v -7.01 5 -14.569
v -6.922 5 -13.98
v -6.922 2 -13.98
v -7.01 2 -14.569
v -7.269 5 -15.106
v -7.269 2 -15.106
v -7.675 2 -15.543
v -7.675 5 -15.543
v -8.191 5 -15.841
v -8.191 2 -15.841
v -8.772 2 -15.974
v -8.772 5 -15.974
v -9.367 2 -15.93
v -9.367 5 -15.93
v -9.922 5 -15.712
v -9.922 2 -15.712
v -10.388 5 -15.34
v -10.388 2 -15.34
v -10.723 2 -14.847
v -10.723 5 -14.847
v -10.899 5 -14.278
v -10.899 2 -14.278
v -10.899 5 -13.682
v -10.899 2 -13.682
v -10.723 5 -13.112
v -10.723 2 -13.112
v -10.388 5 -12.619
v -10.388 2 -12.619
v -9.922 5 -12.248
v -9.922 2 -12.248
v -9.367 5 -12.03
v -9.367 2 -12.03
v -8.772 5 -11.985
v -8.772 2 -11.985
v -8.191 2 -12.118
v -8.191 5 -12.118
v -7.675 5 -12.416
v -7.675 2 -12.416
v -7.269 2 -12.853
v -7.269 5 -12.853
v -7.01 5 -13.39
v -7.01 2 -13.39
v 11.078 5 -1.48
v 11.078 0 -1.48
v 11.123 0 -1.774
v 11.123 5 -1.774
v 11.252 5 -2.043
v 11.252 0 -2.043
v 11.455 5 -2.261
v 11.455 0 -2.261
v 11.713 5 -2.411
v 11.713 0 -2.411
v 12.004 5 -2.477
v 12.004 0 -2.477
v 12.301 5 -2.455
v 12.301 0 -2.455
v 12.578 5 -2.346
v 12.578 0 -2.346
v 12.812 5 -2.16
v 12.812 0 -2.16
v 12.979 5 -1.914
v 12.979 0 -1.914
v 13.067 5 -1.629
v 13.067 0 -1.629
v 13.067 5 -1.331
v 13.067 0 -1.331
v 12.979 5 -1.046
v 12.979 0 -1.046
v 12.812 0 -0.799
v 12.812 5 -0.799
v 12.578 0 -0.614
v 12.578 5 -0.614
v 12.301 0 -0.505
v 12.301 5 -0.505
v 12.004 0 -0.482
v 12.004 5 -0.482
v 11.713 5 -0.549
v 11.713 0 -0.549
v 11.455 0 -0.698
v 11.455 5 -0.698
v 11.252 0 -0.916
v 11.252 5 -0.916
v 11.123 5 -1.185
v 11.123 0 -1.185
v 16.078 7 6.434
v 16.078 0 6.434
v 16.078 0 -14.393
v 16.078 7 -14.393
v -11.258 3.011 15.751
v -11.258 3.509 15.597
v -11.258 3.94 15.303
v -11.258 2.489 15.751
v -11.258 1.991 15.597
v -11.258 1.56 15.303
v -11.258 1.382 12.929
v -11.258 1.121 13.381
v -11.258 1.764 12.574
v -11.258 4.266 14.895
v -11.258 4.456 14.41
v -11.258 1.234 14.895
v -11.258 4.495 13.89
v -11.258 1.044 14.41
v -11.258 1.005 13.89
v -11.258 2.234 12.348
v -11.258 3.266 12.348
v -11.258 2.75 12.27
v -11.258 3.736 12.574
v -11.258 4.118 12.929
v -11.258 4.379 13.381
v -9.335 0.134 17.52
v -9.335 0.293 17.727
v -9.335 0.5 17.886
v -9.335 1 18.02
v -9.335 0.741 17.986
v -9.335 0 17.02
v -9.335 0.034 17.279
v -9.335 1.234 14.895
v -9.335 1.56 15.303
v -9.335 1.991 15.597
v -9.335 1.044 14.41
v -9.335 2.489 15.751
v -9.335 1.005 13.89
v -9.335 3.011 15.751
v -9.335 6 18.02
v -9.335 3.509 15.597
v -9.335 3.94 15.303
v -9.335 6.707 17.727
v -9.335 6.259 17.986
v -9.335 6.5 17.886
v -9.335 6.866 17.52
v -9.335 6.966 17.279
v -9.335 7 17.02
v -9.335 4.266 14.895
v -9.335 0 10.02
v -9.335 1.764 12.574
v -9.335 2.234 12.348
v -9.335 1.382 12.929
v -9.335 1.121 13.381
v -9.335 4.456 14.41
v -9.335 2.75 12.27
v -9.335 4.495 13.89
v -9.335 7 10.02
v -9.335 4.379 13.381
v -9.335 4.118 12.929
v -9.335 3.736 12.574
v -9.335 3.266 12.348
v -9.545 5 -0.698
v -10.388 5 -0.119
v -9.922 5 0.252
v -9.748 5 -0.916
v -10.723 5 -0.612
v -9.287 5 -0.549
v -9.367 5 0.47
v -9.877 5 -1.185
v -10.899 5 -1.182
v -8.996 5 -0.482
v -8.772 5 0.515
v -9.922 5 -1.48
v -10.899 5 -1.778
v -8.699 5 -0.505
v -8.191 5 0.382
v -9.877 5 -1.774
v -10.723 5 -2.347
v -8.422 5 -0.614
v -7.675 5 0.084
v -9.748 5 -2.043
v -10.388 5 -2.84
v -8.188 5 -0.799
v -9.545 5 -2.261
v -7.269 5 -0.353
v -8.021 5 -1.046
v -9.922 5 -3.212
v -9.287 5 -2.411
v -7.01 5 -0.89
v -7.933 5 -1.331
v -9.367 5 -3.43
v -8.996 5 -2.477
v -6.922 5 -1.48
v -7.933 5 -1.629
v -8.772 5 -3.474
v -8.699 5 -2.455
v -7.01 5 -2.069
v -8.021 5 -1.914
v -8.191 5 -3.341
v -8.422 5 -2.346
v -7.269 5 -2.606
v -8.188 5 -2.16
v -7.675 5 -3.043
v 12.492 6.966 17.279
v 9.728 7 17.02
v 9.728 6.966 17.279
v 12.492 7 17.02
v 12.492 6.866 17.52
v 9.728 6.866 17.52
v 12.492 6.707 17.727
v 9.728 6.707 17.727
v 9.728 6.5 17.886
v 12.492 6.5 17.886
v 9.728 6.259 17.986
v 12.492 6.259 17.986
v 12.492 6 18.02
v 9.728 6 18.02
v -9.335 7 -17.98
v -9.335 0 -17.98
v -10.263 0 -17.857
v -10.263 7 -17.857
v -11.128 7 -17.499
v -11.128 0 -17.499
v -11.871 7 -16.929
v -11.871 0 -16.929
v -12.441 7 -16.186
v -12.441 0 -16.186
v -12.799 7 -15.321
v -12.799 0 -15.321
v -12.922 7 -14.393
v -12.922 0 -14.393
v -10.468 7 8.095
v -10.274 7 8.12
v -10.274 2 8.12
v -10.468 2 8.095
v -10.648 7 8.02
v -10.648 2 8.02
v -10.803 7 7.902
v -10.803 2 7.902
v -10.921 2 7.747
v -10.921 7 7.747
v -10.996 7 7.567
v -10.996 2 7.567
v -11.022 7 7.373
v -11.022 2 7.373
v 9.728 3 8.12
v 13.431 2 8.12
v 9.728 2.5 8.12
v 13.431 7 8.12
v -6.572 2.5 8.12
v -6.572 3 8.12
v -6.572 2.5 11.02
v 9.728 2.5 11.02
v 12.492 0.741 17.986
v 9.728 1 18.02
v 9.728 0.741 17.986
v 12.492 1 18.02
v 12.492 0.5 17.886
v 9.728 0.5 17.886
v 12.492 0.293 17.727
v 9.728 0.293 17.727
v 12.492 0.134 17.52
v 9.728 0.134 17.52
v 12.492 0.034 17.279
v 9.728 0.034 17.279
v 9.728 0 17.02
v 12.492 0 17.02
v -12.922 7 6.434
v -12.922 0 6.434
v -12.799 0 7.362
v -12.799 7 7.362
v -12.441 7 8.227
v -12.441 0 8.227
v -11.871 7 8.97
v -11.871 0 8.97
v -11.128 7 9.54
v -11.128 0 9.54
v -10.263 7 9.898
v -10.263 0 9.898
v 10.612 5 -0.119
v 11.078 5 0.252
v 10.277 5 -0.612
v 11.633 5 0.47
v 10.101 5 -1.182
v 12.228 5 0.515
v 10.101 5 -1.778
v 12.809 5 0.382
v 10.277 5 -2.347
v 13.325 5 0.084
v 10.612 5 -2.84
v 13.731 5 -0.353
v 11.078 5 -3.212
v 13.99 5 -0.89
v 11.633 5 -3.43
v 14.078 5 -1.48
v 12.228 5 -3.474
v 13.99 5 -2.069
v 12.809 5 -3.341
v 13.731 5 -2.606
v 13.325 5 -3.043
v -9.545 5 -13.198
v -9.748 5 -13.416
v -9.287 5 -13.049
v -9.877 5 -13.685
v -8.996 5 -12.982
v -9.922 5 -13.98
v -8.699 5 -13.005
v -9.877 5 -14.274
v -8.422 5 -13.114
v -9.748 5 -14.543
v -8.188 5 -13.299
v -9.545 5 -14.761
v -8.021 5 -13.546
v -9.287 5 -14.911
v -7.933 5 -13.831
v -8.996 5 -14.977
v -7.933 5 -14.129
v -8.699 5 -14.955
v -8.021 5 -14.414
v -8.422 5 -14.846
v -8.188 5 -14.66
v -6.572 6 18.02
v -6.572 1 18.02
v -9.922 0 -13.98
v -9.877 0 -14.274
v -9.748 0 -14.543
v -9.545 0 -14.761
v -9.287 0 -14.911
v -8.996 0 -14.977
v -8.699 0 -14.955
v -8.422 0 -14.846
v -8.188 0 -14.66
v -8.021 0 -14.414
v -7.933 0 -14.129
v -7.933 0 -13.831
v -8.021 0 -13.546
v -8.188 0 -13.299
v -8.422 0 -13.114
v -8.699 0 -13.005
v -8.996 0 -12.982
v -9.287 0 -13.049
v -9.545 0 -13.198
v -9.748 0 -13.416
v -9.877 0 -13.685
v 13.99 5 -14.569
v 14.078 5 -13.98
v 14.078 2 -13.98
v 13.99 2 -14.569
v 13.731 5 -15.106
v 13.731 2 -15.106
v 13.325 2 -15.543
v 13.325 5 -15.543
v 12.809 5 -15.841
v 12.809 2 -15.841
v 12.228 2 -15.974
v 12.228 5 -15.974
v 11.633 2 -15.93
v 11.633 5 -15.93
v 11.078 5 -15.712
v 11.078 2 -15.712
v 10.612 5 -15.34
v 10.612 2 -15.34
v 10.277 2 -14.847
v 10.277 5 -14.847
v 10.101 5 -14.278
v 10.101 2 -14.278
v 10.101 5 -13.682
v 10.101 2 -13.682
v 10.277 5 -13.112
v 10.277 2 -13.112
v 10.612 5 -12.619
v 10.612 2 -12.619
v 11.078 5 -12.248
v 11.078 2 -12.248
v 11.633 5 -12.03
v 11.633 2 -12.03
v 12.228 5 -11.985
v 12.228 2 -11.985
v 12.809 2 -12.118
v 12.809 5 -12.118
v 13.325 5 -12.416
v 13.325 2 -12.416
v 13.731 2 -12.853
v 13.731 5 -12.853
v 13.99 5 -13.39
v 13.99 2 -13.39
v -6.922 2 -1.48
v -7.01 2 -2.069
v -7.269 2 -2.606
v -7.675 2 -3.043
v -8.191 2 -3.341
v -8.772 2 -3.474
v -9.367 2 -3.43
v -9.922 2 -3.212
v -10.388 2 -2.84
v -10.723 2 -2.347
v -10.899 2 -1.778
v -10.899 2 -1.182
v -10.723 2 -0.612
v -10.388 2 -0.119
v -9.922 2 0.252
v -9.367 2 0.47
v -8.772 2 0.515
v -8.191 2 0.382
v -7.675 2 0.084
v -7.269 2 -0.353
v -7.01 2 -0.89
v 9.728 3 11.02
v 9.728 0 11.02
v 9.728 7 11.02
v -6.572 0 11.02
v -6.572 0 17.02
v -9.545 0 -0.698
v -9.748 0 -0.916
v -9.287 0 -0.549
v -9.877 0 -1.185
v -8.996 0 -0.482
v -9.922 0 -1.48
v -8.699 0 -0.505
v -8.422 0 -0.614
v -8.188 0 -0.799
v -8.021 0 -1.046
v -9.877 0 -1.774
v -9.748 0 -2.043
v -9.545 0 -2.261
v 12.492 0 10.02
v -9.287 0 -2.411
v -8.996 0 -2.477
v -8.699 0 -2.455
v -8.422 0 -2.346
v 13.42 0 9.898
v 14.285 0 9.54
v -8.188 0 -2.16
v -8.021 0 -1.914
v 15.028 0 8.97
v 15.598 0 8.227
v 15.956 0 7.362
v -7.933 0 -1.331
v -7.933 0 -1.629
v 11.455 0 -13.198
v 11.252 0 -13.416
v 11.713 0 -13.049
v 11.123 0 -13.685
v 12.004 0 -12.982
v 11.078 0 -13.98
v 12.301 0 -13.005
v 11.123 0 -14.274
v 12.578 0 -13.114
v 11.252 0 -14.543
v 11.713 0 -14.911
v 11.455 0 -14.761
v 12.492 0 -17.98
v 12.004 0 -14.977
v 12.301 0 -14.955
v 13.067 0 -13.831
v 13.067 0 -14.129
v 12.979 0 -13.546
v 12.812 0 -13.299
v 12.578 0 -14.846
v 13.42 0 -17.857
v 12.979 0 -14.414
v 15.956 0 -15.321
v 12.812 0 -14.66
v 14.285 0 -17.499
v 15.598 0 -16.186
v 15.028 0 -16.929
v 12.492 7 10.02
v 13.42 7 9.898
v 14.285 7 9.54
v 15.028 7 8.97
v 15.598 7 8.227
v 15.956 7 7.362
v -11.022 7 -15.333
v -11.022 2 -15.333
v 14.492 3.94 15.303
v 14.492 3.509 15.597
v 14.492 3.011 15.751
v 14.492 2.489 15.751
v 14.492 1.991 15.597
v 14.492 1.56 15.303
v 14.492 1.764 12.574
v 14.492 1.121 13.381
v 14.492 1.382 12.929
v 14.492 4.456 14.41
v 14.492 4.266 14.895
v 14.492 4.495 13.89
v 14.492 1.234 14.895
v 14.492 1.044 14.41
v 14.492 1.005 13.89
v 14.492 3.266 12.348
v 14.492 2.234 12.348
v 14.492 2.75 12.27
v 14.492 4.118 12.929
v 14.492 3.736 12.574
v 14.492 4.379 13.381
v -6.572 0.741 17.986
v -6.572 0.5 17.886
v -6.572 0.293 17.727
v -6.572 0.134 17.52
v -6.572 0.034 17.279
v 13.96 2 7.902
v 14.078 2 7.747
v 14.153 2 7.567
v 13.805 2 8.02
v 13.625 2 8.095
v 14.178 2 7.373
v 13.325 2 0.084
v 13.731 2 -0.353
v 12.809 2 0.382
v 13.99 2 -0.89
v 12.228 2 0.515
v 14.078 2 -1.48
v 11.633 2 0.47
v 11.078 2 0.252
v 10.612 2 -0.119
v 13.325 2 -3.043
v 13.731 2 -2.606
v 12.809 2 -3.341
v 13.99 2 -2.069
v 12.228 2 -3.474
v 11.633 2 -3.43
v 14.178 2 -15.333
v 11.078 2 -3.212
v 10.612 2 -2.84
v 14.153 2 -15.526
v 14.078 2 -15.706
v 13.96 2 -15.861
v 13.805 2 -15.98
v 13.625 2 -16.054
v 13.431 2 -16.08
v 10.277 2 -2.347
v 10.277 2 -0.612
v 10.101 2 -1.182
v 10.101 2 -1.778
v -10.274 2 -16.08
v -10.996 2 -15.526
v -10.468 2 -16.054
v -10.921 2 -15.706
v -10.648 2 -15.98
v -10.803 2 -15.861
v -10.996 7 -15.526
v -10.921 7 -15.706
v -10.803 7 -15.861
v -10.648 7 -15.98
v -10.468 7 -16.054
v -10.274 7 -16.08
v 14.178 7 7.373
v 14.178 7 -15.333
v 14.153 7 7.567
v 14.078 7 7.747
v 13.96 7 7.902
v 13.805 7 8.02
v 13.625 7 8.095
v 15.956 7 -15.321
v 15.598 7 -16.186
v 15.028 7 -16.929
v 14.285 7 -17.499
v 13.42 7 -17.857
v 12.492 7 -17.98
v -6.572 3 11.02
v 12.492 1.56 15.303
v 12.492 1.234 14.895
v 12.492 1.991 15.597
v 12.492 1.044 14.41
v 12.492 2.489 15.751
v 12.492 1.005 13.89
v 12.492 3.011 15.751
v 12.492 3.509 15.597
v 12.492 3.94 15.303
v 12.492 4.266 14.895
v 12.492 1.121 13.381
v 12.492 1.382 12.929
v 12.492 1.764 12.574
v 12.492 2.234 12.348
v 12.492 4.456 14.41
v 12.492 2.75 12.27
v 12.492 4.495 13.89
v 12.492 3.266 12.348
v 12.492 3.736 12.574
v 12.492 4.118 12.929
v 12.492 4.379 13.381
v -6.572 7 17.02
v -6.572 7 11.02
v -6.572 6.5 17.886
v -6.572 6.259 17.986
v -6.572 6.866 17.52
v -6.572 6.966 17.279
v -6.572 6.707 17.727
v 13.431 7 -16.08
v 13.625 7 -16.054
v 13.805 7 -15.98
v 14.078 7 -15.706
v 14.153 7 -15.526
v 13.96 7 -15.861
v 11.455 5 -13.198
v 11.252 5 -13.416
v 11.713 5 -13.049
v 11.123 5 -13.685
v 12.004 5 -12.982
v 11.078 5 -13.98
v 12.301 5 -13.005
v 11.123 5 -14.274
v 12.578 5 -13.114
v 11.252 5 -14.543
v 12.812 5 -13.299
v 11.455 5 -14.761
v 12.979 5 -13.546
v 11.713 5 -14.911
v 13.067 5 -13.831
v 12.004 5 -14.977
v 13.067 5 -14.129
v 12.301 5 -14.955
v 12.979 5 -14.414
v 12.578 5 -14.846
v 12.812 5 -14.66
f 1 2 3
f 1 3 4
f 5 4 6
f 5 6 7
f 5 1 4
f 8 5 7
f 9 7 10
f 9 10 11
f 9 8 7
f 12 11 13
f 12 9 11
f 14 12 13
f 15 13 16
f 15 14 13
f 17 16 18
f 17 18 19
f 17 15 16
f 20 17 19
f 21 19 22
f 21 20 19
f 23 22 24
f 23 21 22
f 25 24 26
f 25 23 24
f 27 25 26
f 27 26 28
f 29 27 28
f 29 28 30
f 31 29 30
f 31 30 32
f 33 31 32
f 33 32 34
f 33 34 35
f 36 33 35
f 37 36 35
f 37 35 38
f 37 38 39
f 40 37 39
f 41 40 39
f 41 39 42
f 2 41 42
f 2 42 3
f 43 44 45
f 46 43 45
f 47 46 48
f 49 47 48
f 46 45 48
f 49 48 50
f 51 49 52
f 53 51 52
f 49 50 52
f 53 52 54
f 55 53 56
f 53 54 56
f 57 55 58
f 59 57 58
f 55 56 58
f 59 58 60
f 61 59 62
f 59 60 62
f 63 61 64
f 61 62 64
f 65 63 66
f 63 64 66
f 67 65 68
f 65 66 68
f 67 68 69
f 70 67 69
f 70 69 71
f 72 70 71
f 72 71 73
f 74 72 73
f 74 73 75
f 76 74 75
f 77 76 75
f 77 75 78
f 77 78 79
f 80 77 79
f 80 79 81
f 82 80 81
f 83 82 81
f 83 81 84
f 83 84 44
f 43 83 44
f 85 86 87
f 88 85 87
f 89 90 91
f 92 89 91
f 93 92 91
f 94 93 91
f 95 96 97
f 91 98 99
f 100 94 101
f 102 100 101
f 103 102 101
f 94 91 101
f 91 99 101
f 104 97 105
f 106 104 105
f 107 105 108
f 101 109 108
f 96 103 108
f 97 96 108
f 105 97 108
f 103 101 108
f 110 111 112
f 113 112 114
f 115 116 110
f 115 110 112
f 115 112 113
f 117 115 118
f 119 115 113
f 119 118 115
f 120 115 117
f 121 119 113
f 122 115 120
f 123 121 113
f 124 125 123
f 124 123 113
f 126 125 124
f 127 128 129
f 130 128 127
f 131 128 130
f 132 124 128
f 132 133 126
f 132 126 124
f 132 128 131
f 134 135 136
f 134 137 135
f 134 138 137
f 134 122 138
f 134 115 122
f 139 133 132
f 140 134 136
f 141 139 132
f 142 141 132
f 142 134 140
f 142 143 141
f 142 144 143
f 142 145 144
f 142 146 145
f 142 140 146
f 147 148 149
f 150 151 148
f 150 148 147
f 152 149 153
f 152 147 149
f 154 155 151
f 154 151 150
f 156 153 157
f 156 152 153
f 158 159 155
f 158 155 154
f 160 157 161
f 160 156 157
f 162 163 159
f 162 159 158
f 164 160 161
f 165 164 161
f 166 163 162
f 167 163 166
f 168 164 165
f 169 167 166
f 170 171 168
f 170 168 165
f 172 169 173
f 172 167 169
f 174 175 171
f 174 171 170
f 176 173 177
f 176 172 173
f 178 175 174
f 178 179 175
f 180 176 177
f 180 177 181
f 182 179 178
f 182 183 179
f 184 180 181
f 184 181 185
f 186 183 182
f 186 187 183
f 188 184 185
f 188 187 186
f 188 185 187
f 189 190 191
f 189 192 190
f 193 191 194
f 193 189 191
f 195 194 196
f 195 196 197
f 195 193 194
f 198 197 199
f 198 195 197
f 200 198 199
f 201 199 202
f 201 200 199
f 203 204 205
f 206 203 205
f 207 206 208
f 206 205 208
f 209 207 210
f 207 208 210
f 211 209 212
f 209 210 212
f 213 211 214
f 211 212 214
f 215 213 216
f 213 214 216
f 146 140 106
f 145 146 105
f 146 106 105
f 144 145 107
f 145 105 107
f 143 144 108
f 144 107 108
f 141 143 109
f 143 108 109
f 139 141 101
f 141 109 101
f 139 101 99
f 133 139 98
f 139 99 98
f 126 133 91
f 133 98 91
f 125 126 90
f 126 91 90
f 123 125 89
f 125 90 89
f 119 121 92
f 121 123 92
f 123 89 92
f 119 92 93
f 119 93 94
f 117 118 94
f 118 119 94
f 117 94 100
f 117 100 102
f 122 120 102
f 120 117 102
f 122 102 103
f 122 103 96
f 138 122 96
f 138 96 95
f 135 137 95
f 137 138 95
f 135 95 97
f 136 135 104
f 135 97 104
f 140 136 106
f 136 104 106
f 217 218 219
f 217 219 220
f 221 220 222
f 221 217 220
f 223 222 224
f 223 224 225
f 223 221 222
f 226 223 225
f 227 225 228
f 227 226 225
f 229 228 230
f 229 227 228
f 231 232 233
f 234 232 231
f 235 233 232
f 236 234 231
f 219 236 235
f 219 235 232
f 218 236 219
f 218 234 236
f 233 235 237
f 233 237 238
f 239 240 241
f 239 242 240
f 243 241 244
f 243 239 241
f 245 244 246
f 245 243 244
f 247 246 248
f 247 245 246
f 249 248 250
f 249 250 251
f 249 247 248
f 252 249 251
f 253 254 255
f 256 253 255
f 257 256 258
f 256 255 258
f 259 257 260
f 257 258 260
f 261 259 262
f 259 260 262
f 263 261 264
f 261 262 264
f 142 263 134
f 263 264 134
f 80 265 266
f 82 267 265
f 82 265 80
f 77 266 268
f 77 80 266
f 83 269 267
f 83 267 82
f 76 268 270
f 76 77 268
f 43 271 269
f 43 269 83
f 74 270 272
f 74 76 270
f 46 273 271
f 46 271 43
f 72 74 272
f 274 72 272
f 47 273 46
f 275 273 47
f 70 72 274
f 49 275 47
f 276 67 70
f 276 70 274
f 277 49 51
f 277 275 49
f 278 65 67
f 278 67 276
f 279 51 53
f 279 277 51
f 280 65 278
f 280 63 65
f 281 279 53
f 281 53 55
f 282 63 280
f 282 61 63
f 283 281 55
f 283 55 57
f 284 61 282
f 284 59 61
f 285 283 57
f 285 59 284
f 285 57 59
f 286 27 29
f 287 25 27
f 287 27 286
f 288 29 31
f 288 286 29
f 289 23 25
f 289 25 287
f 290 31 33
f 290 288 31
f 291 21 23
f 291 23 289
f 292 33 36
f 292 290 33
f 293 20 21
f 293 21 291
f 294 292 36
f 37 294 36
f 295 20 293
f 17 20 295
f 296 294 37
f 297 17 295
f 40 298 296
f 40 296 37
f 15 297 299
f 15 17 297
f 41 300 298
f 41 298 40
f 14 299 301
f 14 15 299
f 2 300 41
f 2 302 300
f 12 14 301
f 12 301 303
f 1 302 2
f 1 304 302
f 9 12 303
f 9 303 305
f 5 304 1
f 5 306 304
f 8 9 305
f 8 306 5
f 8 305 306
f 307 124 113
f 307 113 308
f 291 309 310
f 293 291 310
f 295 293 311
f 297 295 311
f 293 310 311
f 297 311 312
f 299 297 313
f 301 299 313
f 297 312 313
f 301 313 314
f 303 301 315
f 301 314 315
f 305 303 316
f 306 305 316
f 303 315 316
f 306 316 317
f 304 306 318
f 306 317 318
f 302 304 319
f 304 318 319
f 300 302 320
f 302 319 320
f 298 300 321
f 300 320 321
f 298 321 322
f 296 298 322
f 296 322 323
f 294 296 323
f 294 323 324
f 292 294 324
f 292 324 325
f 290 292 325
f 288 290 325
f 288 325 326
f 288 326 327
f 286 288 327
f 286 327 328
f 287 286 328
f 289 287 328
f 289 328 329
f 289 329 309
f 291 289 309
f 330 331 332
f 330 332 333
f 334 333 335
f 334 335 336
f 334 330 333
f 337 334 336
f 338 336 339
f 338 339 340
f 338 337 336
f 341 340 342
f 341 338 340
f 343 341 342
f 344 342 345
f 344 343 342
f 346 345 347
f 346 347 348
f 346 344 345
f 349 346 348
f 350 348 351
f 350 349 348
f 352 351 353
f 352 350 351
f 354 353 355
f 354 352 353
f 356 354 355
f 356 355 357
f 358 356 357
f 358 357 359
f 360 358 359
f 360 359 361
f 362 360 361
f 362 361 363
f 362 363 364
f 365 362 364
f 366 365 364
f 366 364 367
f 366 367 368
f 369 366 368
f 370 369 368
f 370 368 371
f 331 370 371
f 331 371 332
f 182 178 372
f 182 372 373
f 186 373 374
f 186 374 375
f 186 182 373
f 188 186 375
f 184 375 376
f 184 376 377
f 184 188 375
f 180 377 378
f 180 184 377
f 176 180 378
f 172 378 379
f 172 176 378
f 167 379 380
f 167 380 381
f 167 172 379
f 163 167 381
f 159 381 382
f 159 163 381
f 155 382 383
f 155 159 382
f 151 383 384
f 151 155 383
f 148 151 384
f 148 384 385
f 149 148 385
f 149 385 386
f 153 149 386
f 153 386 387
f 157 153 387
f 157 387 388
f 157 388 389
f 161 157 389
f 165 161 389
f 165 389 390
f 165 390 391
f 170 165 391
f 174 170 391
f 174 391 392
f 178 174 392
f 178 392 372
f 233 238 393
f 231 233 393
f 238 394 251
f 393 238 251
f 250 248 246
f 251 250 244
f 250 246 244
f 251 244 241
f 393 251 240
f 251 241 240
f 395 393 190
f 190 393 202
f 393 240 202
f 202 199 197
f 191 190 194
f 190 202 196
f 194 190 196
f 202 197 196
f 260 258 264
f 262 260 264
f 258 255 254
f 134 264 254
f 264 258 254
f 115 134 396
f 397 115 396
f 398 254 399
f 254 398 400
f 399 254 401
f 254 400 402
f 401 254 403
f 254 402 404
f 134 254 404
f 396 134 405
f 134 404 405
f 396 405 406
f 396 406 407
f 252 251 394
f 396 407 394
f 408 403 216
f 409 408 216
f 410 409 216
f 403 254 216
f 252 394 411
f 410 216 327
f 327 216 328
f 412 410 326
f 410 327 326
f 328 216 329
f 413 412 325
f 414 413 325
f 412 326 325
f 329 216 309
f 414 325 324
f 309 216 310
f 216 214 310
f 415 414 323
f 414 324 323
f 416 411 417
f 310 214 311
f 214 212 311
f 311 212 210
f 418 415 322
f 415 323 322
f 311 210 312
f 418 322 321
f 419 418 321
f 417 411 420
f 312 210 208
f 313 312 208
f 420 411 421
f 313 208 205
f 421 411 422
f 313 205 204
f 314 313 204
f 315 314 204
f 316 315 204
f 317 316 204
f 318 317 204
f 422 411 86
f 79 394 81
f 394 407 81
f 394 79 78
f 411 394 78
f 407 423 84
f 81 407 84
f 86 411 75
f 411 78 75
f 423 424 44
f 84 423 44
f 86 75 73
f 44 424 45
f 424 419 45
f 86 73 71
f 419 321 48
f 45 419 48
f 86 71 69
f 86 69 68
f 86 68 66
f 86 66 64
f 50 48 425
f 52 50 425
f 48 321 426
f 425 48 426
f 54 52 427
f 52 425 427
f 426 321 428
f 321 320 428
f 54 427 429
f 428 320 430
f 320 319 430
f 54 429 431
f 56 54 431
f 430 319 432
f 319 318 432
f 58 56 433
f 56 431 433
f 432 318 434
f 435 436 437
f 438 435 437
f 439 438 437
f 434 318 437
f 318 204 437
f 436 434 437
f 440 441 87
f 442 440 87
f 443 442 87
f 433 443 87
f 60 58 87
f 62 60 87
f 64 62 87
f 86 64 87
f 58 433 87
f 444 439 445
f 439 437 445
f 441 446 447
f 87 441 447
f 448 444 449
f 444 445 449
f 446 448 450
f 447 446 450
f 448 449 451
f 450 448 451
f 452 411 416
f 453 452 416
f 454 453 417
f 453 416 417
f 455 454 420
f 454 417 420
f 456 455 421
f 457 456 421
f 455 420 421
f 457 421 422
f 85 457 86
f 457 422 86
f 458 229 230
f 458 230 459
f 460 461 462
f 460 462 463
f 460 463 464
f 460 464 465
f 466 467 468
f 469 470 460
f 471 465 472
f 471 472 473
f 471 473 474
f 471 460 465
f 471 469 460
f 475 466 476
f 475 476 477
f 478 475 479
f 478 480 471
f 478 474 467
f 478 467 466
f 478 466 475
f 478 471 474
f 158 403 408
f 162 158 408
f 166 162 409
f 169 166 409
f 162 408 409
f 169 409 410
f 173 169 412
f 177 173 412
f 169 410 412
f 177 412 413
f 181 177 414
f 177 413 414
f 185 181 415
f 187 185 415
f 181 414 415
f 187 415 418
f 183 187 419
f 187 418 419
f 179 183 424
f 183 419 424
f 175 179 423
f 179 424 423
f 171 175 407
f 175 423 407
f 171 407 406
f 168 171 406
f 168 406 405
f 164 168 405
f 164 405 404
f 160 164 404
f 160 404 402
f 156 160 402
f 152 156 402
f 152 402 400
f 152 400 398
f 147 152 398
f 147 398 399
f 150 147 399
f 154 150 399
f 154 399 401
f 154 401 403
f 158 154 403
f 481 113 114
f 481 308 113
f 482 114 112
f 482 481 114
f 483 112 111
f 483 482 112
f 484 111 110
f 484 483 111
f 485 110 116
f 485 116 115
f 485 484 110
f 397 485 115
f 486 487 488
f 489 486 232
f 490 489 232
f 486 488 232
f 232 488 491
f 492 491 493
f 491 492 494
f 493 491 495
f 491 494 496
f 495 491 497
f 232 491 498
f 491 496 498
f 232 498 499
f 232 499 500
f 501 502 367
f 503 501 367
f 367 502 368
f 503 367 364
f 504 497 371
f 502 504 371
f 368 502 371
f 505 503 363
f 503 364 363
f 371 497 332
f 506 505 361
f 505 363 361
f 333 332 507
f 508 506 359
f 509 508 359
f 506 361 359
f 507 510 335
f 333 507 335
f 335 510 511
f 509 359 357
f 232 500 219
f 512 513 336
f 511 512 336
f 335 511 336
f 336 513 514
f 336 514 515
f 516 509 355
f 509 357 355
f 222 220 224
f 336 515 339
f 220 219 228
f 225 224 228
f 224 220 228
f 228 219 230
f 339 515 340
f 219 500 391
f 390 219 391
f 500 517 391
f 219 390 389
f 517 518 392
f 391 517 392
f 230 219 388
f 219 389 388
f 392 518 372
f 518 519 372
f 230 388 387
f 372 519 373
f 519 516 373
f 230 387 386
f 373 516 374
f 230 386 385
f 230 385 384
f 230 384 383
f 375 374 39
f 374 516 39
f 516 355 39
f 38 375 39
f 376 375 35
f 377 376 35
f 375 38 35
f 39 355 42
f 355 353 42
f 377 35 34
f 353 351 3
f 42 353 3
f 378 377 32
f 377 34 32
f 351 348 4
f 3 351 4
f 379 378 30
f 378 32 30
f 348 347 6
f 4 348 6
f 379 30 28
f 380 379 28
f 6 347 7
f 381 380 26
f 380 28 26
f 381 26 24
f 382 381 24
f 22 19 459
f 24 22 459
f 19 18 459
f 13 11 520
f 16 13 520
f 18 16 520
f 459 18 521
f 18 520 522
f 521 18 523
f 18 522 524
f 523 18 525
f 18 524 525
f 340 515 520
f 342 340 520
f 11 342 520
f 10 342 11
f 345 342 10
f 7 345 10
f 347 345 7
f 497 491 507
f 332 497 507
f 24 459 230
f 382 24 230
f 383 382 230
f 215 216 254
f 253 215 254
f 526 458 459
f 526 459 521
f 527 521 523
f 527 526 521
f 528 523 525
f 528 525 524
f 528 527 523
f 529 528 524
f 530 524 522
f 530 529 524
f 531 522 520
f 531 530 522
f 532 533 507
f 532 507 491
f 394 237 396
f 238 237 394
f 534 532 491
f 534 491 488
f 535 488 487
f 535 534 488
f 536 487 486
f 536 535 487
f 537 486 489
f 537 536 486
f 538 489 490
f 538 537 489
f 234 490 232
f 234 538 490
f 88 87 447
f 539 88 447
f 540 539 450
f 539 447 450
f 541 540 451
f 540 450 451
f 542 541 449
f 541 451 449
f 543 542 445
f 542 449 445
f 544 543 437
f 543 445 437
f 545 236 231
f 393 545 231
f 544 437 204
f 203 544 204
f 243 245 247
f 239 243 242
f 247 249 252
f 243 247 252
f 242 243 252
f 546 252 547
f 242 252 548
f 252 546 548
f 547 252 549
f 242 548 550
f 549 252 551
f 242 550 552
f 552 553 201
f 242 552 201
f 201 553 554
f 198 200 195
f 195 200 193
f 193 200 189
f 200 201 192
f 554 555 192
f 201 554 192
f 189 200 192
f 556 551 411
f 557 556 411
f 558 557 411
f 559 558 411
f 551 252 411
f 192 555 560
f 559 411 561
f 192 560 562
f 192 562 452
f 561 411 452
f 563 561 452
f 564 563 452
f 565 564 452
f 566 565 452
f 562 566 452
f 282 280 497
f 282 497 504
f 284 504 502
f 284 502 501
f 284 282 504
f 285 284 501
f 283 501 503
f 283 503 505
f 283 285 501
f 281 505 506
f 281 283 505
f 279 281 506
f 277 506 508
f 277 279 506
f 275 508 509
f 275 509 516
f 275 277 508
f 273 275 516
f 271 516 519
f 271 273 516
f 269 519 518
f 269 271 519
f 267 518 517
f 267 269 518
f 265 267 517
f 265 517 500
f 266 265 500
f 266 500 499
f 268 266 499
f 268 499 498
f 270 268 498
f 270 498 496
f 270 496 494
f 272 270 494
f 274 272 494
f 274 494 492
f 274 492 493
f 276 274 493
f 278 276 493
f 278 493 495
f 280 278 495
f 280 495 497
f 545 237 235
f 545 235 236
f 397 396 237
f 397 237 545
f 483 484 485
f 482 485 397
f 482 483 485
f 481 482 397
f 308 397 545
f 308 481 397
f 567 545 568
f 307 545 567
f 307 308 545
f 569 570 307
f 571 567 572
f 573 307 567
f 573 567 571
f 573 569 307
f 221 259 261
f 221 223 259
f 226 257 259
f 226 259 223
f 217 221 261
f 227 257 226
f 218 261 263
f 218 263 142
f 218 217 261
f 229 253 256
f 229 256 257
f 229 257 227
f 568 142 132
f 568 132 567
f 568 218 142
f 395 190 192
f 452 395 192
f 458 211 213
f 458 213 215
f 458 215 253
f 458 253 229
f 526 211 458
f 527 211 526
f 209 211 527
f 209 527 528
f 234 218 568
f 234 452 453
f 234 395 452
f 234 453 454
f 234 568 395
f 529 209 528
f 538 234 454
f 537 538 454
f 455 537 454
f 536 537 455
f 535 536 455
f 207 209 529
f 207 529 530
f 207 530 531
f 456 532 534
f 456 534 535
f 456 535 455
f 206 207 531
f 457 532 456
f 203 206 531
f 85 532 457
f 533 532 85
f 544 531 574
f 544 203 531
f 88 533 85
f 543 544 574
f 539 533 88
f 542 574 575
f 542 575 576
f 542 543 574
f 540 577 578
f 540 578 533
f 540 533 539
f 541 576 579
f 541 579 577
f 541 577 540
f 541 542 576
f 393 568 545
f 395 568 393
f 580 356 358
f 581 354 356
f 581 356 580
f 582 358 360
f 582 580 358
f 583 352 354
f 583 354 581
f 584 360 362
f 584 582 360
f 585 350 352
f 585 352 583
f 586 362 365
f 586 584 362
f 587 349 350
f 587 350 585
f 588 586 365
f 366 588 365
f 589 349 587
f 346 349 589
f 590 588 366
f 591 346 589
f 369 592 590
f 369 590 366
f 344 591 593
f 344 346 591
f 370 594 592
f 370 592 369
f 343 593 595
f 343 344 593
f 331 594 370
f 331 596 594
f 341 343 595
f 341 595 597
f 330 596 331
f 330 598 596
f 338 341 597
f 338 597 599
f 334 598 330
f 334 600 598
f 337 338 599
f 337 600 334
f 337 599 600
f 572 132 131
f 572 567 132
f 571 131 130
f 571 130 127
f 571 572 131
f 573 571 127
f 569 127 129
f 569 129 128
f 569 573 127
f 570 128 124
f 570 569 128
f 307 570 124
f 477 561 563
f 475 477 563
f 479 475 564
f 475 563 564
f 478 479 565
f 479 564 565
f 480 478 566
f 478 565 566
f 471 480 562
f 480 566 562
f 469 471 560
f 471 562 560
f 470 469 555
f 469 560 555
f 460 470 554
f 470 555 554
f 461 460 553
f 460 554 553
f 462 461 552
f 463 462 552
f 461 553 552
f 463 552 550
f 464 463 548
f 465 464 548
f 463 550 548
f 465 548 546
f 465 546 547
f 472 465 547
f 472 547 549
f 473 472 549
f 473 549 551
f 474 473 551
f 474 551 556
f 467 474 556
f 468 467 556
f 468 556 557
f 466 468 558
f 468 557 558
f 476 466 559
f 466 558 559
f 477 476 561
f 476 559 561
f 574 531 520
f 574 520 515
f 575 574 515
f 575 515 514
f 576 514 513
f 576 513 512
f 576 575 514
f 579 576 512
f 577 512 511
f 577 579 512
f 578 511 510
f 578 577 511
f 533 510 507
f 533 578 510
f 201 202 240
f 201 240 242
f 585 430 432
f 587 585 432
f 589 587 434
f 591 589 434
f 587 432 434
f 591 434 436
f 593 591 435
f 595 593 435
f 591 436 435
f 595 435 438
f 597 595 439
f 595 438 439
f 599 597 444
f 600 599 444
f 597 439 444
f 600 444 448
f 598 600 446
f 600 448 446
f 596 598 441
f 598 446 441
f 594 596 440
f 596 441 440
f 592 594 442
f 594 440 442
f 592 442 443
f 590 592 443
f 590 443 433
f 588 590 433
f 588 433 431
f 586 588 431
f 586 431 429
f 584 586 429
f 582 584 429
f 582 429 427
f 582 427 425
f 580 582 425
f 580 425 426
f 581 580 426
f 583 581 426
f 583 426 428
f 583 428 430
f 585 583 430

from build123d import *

# Parameters (mm, degrees)
BOSS_EXTRUDE1_DEPTH   = 7
SKETCH2_R             = 2
CUT_EXTRUDE2_DEPTH    = 5
SKETCH3_R             = 2
CUT_EXTRUDE3_DEPTH    = 2
SKETCH4_W             = 16.3
SKETCH4_H             = 0.5
CUT_EXTRUDE4_DEPTH    = 2
F_2_0MM_DOWEL_HOLE1_D = 2
SKETCH8_W             = 21.826362025
SKETCH8_H             = 7
SKETCH8_W_2           = 16.3
SKETCH8_H_2           = 0.5
BOSS_EXTRUDE2_DEPTH   = 8
SKETCH9_R             = 1.75
BOSS_EXTRUDE3_DEPTH   = 2
LPATTERN4_COUNT       = 2
LPATTERN4_PITCH       = 23.75
SKETCH10_W            = 16.3
SKETCH10_H            = 7
CUT_EXTRUDE5_DEPTH    = 7
FILLET1_R             = 1


with BuildPart() as part:
    # Sketch1 → Boss-Extrude1 (new body)
    with BuildSketch(Plane(origin=(0, 0, 0), x_dir=(1, 0, 0), z_dir=(0, 1, 0))):
        with BuildLine():
            Line((-12.921525848, 14.392842997), (-12.921525848, -6.433519028))
            ThreePointArc((-12.921525848, -6.433519028), (-11.87097089, -8.969783057), (-9.334706861, -10.020338016))
            Line((-9.334706861, -10.020338016), (12.491655164, -10.020338016))
            ThreePointArc((12.491655164, -10.020338016), (15.027919193, -8.969783057), (16.078474152, -6.433519028))
            Line((16.078474152, -6.433519028), (16.078474152, 14.392842997))
            ThreePointArc((16.078474152, 14.392842997), (15.027919193, 16.929107026), (12.491655164, 17.979661984))
            Line((12.491655164, 17.979661984), (-9.334706861, 17.979661984))
            ThreePointArc((-9.334706861, 17.979661984), (-11.87097089, 16.929107026), (-12.921525848, 14.392842997))
        make_face()
    extrude(amount=BOSS_EXTRUDE1_DEPTH)

    # Sketch2 → Cut-Extrude2 (cut)
    with BuildSketch(Plane(origin=(0, 7, 0), x_dir=(1, 0, 0), z_dir=(0, 1, 0))):
        with BuildLine():
            Line((-10.27448552, 16.079661984), (13.431433823, 16.079661984))
            ThreePointArc((13.431433823, 16.079661984), (13.959671105, 15.860858938), (14.178474152, 15.332621656))
            Line((14.178474152, 15.332621656), (14.178474152, -7.373297687))
            ThreePointArc((14.178474152, -7.373297687), (13.959671105, -7.901534969), (13.431433823, -8.120338016))
            Line((13.431433823, -8.120338016), (-10.27448552, -8.120338016))
            ThreePointArc((-10.27448552, -8.120338016), (-10.802722802, -7.901534969), (-11.021525848, -7.373297687))
            Line((-11.021525848, -7.373297687), (-11.021525848, 15.332621656))
            ThreePointArc((-11.021525848, 15.332621656), (-10.802722802, 15.860858938), (-10.27448552, 16.079661984))
        make_face()
        with Locations((-8.921525848, 13.979661984)):
            Circle(SKETCH2_R, mode=Mode.SUBTRACT)
        with Locations((12.078474152, 13.979661984)):
            Circle(SKETCH2_R, mode=Mode.SUBTRACT)
        with Locations((-8.921525848, 1.479661984)):
            Circle(SKETCH2_R, mode=Mode.SUBTRACT)
        with Locations((12.078474152, 1.479661984)):
            Circle(SKETCH2_R, mode=Mode.SUBTRACT)
    extrude(amount=-CUT_EXTRUDE2_DEPTH, mode=Mode.SUBTRACT)

    # Sketch3 → Cut-Extrude3 (cut)
    with BuildSketch(Plane(origin=(0, 7, 0), x_dir=(1, 0, 0), z_dir=(0, 1, 0))):
        with Locations((12.078474152, 13.979661984)):
            Circle(SKETCH3_R)
        with Locations((12.078474152, 1.479661984)):
            Circle(SKETCH3_R)
        with Locations((-8.921525848, 13.979661984)):
            Circle(SKETCH3_R)
        with Locations((-8.921525848, 1.479661984)):
            Circle(SKETCH3_R)
    extrude(amount=-CUT_EXTRUDE3_DEPTH, mode=Mode.SUBTRACT)

    # Sketch4 → Cut-Extrude4 (cut)
    with BuildSketch(Plane.XY.offset(10.020338016)):
        with Locations((1.578474152, 2.75)):
            Rectangle(SKETCH4_W, SKETCH4_H)
    extrude(amount=-CUT_EXTRUDE4_DEPTH, mode=Mode.SUBTRACT)

    # Ø2.0mm Dowel Hole1 (through all)
    with Locations(Plane(origin=(0, 5, 0), x_dir=(1, 0, 0), z_dir=(0, 1, 0))):
        with Locations((12.078474152, 1.479661984), (12.078474152, 13.979661984), (-8.921525848, 1.479661984), (-8.921525848, 13.979661984)):
            Hole(F_2_0MM_DOWEL_HOLE1_D / 2)

    # Sketch8 → Boss-Extrude2 (add)
    with BuildSketch(Plane.XY.offset(10.020338016)):
        with Locations((1.578474152, 3.5)):
            Rectangle(SKETCH8_W, SKETCH8_H)
        with Locations((1.578474152, 2.75)):
            Rectangle(SKETCH8_W_2, SKETCH8_H_2, mode=Mode.SUBTRACT)
    extrude(amount=BOSS_EXTRUDE2_DEPTH)

    # Sketch9 → Boss-Extrude3 (add)
    with BuildSketch(Plane(origin=(12.491655164, 0, 0), x_dir=(0, 0, -1), z_dir=(1, 0, 0))):
        with Locations((-14.020338016, 2.75)):
            Circle(SKETCH9_R)
    boss_extrude3 = extrude(amount=BOSS_EXTRUDE3_DEPTH)

    # LPattern4: Boss-Extrude3 ×2
    with Locations(*[(-i * LPATTERN4_PITCH, 0, 0) for i in range(1, LPATTERN4_COUNT)]):
        add(boss_extrude3)

    # Sketch10 → Cut-Extrude5 (cut)
    with BuildSketch(Plane.XY.offset(18.020338016)):
        with Locations((1.578474152, 3.5)):
            Rectangle(SKETCH10_W, SKETCH10_H)
    extrude(amount=-CUT_EXTRUDE5_DEPTH, mode=Mode.SUBTRACT)

    # Fillet1
    fillet1_edges = [part.edges().sort_by_distance(p)[0] for p in [
        (-7.953116354, 0, 18.020338016),
        (11.110064658, 7, 18.020338016),
        (11.110064658, 0, 18.020338016),
        (-7.953116354, 7, 18.020338016),
    ]]
    fillet(fillet1_edges, radius=FILLET1_R)


solid = part.part
